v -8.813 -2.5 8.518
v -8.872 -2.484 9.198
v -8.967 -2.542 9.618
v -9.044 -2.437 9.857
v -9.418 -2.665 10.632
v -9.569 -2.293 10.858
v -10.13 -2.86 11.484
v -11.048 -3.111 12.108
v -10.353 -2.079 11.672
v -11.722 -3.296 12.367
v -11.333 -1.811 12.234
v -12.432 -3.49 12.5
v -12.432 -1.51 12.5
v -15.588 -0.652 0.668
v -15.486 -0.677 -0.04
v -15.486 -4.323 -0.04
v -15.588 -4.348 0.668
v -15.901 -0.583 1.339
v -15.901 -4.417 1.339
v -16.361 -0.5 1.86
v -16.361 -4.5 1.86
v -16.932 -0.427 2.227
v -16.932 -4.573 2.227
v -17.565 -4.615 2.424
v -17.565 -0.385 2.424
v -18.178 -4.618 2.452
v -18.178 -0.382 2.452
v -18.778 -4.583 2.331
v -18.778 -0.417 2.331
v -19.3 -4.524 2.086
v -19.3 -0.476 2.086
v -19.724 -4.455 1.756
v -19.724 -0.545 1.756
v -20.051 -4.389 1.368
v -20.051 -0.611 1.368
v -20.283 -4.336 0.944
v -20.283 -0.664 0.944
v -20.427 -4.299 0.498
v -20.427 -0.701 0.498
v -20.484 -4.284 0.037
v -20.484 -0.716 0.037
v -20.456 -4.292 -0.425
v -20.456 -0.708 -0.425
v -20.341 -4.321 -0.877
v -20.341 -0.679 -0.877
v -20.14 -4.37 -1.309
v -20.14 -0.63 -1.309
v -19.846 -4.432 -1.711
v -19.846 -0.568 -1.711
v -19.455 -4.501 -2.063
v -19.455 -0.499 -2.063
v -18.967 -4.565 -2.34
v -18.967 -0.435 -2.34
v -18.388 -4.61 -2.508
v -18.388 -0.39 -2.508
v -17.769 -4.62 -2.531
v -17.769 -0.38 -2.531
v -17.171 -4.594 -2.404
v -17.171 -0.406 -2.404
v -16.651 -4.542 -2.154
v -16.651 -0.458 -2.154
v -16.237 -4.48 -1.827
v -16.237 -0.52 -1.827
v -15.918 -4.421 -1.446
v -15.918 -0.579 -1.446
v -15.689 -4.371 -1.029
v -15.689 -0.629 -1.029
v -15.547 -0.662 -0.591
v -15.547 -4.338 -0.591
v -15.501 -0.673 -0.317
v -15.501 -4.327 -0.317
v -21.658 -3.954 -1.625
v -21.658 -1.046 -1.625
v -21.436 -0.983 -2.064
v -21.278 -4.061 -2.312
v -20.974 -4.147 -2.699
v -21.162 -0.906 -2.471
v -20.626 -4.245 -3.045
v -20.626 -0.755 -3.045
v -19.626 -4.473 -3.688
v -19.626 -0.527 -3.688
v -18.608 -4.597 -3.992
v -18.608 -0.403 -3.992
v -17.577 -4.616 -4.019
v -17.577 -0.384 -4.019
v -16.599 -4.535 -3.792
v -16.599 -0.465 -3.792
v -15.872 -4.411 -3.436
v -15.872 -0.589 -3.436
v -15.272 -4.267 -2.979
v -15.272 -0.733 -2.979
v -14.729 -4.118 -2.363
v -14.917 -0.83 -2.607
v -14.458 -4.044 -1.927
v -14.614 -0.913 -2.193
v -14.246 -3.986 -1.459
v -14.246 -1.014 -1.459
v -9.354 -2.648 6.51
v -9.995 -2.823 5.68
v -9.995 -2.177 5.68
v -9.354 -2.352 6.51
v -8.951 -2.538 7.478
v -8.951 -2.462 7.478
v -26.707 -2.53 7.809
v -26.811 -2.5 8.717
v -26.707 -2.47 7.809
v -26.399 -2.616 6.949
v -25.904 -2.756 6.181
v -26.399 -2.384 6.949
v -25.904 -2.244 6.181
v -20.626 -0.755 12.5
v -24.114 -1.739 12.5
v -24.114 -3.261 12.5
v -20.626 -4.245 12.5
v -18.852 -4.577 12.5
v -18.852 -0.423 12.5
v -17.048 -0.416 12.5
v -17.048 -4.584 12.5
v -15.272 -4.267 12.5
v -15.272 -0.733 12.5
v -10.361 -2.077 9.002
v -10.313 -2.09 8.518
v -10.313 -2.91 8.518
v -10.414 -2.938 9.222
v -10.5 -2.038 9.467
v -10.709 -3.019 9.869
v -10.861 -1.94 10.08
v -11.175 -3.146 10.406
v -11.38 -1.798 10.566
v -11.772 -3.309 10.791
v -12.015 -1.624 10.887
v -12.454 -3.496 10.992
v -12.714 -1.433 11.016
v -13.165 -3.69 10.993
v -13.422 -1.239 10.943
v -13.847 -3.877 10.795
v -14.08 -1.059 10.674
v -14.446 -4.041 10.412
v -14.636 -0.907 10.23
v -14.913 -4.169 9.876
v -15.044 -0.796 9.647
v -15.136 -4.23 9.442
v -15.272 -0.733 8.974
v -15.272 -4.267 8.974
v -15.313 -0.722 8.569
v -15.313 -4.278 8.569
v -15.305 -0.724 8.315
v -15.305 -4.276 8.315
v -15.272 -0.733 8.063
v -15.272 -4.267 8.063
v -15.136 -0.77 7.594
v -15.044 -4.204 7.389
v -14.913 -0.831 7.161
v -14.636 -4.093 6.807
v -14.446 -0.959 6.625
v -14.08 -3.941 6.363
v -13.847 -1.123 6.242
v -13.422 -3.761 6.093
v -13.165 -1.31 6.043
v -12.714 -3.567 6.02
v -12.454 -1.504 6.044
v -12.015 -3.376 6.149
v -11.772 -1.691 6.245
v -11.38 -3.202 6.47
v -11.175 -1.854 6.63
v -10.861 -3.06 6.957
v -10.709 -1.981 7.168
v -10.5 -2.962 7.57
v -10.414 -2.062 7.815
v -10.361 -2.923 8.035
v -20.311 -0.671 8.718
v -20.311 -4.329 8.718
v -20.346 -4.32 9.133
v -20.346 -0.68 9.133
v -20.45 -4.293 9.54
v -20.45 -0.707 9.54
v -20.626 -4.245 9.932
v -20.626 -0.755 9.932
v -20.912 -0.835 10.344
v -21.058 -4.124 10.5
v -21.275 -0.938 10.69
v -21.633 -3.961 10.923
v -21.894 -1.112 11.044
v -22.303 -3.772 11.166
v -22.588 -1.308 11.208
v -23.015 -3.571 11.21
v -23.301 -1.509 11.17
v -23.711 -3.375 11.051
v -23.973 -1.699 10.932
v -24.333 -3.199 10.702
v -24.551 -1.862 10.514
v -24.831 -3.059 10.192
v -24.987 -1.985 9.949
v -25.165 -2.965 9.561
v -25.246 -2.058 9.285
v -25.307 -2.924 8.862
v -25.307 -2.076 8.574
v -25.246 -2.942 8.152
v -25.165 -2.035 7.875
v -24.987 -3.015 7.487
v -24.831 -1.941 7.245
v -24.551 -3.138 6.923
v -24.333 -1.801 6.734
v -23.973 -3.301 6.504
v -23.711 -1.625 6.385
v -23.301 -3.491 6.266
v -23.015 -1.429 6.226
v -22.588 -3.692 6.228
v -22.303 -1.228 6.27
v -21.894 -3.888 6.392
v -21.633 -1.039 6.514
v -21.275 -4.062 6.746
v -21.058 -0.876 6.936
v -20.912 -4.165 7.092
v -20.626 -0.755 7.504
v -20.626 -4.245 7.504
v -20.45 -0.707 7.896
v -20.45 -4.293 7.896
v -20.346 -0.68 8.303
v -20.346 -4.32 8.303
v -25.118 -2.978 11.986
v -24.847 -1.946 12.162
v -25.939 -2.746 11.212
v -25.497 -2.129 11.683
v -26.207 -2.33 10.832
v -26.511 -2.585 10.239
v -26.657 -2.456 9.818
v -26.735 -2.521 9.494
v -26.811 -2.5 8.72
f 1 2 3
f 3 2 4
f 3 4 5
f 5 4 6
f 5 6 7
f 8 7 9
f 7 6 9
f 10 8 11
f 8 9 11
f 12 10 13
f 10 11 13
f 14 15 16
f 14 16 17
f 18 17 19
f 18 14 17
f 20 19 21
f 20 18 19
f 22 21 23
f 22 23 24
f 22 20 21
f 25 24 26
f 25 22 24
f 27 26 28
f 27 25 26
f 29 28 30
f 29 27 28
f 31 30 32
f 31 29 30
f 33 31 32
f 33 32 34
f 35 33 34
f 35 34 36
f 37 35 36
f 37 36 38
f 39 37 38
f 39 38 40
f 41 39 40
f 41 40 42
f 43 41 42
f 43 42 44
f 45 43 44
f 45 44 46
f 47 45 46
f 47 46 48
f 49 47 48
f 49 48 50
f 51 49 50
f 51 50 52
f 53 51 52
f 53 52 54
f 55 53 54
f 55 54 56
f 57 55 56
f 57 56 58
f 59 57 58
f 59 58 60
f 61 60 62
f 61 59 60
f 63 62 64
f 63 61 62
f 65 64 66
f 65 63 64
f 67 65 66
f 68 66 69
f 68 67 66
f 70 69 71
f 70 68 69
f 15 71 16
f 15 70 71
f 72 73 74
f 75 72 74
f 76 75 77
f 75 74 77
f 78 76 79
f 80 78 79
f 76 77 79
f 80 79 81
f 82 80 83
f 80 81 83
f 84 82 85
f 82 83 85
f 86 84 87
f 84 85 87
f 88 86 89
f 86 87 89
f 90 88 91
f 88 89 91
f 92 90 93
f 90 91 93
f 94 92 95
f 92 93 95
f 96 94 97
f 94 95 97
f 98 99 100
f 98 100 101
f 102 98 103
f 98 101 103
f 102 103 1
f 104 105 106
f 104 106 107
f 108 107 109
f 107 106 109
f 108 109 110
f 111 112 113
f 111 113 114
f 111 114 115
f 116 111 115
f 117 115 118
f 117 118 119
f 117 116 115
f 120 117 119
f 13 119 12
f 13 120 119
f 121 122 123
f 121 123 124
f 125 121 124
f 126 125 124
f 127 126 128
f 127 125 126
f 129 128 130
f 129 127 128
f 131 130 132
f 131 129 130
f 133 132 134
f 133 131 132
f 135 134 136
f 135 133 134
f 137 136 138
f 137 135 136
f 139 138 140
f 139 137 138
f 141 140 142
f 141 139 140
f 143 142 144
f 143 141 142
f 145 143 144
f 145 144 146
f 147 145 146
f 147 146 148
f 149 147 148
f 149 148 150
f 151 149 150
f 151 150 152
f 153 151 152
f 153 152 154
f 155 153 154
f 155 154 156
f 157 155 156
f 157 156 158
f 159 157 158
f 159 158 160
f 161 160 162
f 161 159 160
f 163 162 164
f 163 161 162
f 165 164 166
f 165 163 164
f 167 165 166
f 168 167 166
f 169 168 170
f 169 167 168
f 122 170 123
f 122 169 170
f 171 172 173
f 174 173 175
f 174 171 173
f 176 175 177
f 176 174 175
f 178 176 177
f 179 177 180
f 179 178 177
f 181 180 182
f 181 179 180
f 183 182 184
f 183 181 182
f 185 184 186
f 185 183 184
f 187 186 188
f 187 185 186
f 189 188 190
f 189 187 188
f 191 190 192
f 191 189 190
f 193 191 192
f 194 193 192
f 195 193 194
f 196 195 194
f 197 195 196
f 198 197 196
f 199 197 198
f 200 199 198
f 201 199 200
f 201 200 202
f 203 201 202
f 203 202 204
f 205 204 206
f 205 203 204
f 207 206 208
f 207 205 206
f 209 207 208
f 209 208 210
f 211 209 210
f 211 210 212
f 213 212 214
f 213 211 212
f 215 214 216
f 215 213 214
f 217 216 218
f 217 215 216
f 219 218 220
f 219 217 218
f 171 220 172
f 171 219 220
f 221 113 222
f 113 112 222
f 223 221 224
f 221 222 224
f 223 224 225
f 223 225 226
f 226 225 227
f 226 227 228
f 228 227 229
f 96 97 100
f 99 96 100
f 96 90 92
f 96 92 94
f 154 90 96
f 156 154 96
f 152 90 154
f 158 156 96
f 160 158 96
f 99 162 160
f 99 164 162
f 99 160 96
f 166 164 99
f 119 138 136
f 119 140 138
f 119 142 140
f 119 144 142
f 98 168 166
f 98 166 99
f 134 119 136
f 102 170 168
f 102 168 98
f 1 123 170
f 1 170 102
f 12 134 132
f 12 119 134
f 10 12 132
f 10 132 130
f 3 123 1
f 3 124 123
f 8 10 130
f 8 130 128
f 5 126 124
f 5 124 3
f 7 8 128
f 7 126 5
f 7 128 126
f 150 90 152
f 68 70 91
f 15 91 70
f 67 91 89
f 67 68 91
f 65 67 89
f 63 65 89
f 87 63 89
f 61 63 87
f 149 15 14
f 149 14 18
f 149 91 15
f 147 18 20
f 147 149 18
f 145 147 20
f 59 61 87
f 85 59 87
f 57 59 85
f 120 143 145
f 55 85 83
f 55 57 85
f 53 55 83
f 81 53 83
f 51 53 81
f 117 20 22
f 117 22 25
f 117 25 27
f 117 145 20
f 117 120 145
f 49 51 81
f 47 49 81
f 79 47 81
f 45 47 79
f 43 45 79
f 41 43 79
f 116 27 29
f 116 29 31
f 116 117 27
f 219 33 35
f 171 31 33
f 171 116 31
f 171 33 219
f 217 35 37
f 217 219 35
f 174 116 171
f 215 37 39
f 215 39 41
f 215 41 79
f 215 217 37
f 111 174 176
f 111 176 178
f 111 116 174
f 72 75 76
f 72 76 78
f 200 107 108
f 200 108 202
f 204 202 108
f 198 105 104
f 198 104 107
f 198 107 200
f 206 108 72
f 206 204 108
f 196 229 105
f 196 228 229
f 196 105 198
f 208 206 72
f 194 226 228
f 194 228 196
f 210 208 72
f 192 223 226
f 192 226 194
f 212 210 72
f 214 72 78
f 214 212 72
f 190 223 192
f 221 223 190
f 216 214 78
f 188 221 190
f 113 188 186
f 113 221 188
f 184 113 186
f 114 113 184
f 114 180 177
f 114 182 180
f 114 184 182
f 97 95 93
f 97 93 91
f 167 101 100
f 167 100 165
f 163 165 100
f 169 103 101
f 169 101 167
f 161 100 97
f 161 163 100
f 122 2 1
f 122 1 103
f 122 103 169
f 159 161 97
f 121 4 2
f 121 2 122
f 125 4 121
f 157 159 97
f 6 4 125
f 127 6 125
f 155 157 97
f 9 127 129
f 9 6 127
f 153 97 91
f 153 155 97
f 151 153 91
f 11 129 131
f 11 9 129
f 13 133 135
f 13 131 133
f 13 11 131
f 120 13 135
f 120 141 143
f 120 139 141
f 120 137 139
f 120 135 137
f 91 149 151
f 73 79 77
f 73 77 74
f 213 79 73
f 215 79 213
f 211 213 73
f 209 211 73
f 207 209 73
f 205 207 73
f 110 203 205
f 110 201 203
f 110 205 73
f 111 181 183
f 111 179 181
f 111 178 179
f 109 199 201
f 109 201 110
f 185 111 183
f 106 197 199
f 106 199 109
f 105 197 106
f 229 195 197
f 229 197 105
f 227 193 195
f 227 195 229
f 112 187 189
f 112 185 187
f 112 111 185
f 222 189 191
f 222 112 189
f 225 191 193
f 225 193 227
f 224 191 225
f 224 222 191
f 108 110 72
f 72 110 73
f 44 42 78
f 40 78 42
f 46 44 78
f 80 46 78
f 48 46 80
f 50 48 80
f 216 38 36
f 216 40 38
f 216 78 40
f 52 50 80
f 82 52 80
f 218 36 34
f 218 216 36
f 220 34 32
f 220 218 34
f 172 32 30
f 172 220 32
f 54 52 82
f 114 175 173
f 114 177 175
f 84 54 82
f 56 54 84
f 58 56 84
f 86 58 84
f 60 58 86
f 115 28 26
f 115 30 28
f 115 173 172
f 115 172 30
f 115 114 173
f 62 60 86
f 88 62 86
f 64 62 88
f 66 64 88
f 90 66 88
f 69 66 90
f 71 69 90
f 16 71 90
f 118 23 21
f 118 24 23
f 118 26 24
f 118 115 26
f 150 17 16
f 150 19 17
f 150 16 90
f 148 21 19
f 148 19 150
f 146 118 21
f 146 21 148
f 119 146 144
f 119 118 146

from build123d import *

# Parameters (mm, degrees)
F0_R     = 2.5
F1_DEPTH = 5
F2_DEPTH = 7.6
F4_DEPTH = 12.5


with BuildPart() as f1:
    # F0 (on Front) → F1 (new body)
    with BuildSketch(Plane.XZ):
        with BuildLine():
            ThreePointArc((-13.985505, -0.040325), (-18.794733, 3.876963), (-21.658079, -1.625316))
            ThreePointArc((-21.658079, -1.625316), (-17.895778, -4.039319), (-14.245536, -1.458999))
            ThreePointArc((-14.245536, -1.458999), (-14.05105, -0.761479), (-13.985505, -0.040325))
        make_face()
        with Locations((-17.985505, -0.040325)):
            Circle(F0_R, mode=Mode.SUBTRACT)
        with BuildLine():
            ThreePointArc((-8.813406, 8.51826), (-9.956912, 11.31834), (-12.733627, 12.517465))
            ThreePointArc((-12.733627, 12.517465), (-16.526603, 7.030925), (-9.994852, 5.679994))
            ThreePointArc((-9.994852, 5.679994), (-9.12056, 6.98109), (-8.813406, 8.51826))
        make_face()
        with Locations((-12.813406, 8.51826)):
            Circle(F0_R, mode=Mode.SUBTRACT)
        with Locations((-17.985505, -0.040325)):
            Circle(F0_R)
        with Locations((-12.813406, 8.51826)):
            Circle(F0_R)
        with Locations((-22.811408, 8.718137)):
            Circle(F0_R)
        with BuildLine():
            ThreePointArc((-22.673007, 12.715742), (-19.934465, 11.497201), (-18.811408, 8.718137))
            ThreePointArc((-18.811408, 8.718137), (-21.464184, 4.951841), (-25.903902, 6.181114))
            Line((-25.903902, 6.181114), (-21.658079, -1.625316))
            ThreePointArc((-21.658079, -1.625316), (-18.794733, 3.876963), (-13.985505, -0.040325))
            ThreePointArc((-13.985505, -0.040325), (-14.05105, -0.761479), (-14.245536, -1.458999))
            Line((-14.245536, -1.458999), (-9.994852, 5.679994))
            ThreePointArc((-9.994852, 5.679994), (-16.526603, 7.030925), (-12.733627, 12.517465))
            Line((-12.733627, 12.517465), (-22.673007, 12.715742))
        make_face()
        with BuildLine():
            ThreePointArc((-25.903902, 6.181114), (-21.464184, 4.951841), (-18.811408, 8.718137))
            ThreePointArc((-18.811408, 8.718137), (-19.934465, 11.497201), (-22.673007, 12.715742))
            ThreePointArc((-22.673007, 12.715742), (-26.397075, 10.490986), (-25.903902, 6.181114))
        make_face()
        with Locations((-22.811408, 8.718137)):
            Circle(F0_R, mode=Mode.SUBTRACT)
    extrude(amount=F1_DEPTH)

    # F0 (on Front) → F2 (cut)
    with BuildSketch(Plane.XZ):
        with Locations((-22.811408, 8.718137)):
            Circle(F0_R)
        with Locations((-12.813406, 8.51826)):
            Circle(F0_R)
        with Locations((-17.985505, -0.040325)):
            Circle(F0_R)
    extrude(amount=F2_DEPTH, mode=Mode.SUBTRACT)

    # F3 (on Top) → F4 (intersect, symmetric)
    with BuildSketch(Plane.XY):
        with BuildLine():
            Line((-26.811408, -2.5), (-20.626082, -4.245374))
            ThreePointArc((-20.626082, -4.245374), (-17.950294, -4.621121), (-15.271588, -4.26677))
            Line((-15.271588, -4.26677), (-8.813406, -2.5))
            Line((-8.813406, -2.5), (-15.271588, -0.73323))
            ThreePointArc((-15.271588, -0.73323), (-17.950294, -0.378879), (-20.626082, -0.754626))
            Line((-20.626082, -0.754626), (-26.811408, -2.5))
        make_face()
    extrude(amount=F4_DEPTH, both=True, mode=Mode.INTERSECT)


solid = f1.part
